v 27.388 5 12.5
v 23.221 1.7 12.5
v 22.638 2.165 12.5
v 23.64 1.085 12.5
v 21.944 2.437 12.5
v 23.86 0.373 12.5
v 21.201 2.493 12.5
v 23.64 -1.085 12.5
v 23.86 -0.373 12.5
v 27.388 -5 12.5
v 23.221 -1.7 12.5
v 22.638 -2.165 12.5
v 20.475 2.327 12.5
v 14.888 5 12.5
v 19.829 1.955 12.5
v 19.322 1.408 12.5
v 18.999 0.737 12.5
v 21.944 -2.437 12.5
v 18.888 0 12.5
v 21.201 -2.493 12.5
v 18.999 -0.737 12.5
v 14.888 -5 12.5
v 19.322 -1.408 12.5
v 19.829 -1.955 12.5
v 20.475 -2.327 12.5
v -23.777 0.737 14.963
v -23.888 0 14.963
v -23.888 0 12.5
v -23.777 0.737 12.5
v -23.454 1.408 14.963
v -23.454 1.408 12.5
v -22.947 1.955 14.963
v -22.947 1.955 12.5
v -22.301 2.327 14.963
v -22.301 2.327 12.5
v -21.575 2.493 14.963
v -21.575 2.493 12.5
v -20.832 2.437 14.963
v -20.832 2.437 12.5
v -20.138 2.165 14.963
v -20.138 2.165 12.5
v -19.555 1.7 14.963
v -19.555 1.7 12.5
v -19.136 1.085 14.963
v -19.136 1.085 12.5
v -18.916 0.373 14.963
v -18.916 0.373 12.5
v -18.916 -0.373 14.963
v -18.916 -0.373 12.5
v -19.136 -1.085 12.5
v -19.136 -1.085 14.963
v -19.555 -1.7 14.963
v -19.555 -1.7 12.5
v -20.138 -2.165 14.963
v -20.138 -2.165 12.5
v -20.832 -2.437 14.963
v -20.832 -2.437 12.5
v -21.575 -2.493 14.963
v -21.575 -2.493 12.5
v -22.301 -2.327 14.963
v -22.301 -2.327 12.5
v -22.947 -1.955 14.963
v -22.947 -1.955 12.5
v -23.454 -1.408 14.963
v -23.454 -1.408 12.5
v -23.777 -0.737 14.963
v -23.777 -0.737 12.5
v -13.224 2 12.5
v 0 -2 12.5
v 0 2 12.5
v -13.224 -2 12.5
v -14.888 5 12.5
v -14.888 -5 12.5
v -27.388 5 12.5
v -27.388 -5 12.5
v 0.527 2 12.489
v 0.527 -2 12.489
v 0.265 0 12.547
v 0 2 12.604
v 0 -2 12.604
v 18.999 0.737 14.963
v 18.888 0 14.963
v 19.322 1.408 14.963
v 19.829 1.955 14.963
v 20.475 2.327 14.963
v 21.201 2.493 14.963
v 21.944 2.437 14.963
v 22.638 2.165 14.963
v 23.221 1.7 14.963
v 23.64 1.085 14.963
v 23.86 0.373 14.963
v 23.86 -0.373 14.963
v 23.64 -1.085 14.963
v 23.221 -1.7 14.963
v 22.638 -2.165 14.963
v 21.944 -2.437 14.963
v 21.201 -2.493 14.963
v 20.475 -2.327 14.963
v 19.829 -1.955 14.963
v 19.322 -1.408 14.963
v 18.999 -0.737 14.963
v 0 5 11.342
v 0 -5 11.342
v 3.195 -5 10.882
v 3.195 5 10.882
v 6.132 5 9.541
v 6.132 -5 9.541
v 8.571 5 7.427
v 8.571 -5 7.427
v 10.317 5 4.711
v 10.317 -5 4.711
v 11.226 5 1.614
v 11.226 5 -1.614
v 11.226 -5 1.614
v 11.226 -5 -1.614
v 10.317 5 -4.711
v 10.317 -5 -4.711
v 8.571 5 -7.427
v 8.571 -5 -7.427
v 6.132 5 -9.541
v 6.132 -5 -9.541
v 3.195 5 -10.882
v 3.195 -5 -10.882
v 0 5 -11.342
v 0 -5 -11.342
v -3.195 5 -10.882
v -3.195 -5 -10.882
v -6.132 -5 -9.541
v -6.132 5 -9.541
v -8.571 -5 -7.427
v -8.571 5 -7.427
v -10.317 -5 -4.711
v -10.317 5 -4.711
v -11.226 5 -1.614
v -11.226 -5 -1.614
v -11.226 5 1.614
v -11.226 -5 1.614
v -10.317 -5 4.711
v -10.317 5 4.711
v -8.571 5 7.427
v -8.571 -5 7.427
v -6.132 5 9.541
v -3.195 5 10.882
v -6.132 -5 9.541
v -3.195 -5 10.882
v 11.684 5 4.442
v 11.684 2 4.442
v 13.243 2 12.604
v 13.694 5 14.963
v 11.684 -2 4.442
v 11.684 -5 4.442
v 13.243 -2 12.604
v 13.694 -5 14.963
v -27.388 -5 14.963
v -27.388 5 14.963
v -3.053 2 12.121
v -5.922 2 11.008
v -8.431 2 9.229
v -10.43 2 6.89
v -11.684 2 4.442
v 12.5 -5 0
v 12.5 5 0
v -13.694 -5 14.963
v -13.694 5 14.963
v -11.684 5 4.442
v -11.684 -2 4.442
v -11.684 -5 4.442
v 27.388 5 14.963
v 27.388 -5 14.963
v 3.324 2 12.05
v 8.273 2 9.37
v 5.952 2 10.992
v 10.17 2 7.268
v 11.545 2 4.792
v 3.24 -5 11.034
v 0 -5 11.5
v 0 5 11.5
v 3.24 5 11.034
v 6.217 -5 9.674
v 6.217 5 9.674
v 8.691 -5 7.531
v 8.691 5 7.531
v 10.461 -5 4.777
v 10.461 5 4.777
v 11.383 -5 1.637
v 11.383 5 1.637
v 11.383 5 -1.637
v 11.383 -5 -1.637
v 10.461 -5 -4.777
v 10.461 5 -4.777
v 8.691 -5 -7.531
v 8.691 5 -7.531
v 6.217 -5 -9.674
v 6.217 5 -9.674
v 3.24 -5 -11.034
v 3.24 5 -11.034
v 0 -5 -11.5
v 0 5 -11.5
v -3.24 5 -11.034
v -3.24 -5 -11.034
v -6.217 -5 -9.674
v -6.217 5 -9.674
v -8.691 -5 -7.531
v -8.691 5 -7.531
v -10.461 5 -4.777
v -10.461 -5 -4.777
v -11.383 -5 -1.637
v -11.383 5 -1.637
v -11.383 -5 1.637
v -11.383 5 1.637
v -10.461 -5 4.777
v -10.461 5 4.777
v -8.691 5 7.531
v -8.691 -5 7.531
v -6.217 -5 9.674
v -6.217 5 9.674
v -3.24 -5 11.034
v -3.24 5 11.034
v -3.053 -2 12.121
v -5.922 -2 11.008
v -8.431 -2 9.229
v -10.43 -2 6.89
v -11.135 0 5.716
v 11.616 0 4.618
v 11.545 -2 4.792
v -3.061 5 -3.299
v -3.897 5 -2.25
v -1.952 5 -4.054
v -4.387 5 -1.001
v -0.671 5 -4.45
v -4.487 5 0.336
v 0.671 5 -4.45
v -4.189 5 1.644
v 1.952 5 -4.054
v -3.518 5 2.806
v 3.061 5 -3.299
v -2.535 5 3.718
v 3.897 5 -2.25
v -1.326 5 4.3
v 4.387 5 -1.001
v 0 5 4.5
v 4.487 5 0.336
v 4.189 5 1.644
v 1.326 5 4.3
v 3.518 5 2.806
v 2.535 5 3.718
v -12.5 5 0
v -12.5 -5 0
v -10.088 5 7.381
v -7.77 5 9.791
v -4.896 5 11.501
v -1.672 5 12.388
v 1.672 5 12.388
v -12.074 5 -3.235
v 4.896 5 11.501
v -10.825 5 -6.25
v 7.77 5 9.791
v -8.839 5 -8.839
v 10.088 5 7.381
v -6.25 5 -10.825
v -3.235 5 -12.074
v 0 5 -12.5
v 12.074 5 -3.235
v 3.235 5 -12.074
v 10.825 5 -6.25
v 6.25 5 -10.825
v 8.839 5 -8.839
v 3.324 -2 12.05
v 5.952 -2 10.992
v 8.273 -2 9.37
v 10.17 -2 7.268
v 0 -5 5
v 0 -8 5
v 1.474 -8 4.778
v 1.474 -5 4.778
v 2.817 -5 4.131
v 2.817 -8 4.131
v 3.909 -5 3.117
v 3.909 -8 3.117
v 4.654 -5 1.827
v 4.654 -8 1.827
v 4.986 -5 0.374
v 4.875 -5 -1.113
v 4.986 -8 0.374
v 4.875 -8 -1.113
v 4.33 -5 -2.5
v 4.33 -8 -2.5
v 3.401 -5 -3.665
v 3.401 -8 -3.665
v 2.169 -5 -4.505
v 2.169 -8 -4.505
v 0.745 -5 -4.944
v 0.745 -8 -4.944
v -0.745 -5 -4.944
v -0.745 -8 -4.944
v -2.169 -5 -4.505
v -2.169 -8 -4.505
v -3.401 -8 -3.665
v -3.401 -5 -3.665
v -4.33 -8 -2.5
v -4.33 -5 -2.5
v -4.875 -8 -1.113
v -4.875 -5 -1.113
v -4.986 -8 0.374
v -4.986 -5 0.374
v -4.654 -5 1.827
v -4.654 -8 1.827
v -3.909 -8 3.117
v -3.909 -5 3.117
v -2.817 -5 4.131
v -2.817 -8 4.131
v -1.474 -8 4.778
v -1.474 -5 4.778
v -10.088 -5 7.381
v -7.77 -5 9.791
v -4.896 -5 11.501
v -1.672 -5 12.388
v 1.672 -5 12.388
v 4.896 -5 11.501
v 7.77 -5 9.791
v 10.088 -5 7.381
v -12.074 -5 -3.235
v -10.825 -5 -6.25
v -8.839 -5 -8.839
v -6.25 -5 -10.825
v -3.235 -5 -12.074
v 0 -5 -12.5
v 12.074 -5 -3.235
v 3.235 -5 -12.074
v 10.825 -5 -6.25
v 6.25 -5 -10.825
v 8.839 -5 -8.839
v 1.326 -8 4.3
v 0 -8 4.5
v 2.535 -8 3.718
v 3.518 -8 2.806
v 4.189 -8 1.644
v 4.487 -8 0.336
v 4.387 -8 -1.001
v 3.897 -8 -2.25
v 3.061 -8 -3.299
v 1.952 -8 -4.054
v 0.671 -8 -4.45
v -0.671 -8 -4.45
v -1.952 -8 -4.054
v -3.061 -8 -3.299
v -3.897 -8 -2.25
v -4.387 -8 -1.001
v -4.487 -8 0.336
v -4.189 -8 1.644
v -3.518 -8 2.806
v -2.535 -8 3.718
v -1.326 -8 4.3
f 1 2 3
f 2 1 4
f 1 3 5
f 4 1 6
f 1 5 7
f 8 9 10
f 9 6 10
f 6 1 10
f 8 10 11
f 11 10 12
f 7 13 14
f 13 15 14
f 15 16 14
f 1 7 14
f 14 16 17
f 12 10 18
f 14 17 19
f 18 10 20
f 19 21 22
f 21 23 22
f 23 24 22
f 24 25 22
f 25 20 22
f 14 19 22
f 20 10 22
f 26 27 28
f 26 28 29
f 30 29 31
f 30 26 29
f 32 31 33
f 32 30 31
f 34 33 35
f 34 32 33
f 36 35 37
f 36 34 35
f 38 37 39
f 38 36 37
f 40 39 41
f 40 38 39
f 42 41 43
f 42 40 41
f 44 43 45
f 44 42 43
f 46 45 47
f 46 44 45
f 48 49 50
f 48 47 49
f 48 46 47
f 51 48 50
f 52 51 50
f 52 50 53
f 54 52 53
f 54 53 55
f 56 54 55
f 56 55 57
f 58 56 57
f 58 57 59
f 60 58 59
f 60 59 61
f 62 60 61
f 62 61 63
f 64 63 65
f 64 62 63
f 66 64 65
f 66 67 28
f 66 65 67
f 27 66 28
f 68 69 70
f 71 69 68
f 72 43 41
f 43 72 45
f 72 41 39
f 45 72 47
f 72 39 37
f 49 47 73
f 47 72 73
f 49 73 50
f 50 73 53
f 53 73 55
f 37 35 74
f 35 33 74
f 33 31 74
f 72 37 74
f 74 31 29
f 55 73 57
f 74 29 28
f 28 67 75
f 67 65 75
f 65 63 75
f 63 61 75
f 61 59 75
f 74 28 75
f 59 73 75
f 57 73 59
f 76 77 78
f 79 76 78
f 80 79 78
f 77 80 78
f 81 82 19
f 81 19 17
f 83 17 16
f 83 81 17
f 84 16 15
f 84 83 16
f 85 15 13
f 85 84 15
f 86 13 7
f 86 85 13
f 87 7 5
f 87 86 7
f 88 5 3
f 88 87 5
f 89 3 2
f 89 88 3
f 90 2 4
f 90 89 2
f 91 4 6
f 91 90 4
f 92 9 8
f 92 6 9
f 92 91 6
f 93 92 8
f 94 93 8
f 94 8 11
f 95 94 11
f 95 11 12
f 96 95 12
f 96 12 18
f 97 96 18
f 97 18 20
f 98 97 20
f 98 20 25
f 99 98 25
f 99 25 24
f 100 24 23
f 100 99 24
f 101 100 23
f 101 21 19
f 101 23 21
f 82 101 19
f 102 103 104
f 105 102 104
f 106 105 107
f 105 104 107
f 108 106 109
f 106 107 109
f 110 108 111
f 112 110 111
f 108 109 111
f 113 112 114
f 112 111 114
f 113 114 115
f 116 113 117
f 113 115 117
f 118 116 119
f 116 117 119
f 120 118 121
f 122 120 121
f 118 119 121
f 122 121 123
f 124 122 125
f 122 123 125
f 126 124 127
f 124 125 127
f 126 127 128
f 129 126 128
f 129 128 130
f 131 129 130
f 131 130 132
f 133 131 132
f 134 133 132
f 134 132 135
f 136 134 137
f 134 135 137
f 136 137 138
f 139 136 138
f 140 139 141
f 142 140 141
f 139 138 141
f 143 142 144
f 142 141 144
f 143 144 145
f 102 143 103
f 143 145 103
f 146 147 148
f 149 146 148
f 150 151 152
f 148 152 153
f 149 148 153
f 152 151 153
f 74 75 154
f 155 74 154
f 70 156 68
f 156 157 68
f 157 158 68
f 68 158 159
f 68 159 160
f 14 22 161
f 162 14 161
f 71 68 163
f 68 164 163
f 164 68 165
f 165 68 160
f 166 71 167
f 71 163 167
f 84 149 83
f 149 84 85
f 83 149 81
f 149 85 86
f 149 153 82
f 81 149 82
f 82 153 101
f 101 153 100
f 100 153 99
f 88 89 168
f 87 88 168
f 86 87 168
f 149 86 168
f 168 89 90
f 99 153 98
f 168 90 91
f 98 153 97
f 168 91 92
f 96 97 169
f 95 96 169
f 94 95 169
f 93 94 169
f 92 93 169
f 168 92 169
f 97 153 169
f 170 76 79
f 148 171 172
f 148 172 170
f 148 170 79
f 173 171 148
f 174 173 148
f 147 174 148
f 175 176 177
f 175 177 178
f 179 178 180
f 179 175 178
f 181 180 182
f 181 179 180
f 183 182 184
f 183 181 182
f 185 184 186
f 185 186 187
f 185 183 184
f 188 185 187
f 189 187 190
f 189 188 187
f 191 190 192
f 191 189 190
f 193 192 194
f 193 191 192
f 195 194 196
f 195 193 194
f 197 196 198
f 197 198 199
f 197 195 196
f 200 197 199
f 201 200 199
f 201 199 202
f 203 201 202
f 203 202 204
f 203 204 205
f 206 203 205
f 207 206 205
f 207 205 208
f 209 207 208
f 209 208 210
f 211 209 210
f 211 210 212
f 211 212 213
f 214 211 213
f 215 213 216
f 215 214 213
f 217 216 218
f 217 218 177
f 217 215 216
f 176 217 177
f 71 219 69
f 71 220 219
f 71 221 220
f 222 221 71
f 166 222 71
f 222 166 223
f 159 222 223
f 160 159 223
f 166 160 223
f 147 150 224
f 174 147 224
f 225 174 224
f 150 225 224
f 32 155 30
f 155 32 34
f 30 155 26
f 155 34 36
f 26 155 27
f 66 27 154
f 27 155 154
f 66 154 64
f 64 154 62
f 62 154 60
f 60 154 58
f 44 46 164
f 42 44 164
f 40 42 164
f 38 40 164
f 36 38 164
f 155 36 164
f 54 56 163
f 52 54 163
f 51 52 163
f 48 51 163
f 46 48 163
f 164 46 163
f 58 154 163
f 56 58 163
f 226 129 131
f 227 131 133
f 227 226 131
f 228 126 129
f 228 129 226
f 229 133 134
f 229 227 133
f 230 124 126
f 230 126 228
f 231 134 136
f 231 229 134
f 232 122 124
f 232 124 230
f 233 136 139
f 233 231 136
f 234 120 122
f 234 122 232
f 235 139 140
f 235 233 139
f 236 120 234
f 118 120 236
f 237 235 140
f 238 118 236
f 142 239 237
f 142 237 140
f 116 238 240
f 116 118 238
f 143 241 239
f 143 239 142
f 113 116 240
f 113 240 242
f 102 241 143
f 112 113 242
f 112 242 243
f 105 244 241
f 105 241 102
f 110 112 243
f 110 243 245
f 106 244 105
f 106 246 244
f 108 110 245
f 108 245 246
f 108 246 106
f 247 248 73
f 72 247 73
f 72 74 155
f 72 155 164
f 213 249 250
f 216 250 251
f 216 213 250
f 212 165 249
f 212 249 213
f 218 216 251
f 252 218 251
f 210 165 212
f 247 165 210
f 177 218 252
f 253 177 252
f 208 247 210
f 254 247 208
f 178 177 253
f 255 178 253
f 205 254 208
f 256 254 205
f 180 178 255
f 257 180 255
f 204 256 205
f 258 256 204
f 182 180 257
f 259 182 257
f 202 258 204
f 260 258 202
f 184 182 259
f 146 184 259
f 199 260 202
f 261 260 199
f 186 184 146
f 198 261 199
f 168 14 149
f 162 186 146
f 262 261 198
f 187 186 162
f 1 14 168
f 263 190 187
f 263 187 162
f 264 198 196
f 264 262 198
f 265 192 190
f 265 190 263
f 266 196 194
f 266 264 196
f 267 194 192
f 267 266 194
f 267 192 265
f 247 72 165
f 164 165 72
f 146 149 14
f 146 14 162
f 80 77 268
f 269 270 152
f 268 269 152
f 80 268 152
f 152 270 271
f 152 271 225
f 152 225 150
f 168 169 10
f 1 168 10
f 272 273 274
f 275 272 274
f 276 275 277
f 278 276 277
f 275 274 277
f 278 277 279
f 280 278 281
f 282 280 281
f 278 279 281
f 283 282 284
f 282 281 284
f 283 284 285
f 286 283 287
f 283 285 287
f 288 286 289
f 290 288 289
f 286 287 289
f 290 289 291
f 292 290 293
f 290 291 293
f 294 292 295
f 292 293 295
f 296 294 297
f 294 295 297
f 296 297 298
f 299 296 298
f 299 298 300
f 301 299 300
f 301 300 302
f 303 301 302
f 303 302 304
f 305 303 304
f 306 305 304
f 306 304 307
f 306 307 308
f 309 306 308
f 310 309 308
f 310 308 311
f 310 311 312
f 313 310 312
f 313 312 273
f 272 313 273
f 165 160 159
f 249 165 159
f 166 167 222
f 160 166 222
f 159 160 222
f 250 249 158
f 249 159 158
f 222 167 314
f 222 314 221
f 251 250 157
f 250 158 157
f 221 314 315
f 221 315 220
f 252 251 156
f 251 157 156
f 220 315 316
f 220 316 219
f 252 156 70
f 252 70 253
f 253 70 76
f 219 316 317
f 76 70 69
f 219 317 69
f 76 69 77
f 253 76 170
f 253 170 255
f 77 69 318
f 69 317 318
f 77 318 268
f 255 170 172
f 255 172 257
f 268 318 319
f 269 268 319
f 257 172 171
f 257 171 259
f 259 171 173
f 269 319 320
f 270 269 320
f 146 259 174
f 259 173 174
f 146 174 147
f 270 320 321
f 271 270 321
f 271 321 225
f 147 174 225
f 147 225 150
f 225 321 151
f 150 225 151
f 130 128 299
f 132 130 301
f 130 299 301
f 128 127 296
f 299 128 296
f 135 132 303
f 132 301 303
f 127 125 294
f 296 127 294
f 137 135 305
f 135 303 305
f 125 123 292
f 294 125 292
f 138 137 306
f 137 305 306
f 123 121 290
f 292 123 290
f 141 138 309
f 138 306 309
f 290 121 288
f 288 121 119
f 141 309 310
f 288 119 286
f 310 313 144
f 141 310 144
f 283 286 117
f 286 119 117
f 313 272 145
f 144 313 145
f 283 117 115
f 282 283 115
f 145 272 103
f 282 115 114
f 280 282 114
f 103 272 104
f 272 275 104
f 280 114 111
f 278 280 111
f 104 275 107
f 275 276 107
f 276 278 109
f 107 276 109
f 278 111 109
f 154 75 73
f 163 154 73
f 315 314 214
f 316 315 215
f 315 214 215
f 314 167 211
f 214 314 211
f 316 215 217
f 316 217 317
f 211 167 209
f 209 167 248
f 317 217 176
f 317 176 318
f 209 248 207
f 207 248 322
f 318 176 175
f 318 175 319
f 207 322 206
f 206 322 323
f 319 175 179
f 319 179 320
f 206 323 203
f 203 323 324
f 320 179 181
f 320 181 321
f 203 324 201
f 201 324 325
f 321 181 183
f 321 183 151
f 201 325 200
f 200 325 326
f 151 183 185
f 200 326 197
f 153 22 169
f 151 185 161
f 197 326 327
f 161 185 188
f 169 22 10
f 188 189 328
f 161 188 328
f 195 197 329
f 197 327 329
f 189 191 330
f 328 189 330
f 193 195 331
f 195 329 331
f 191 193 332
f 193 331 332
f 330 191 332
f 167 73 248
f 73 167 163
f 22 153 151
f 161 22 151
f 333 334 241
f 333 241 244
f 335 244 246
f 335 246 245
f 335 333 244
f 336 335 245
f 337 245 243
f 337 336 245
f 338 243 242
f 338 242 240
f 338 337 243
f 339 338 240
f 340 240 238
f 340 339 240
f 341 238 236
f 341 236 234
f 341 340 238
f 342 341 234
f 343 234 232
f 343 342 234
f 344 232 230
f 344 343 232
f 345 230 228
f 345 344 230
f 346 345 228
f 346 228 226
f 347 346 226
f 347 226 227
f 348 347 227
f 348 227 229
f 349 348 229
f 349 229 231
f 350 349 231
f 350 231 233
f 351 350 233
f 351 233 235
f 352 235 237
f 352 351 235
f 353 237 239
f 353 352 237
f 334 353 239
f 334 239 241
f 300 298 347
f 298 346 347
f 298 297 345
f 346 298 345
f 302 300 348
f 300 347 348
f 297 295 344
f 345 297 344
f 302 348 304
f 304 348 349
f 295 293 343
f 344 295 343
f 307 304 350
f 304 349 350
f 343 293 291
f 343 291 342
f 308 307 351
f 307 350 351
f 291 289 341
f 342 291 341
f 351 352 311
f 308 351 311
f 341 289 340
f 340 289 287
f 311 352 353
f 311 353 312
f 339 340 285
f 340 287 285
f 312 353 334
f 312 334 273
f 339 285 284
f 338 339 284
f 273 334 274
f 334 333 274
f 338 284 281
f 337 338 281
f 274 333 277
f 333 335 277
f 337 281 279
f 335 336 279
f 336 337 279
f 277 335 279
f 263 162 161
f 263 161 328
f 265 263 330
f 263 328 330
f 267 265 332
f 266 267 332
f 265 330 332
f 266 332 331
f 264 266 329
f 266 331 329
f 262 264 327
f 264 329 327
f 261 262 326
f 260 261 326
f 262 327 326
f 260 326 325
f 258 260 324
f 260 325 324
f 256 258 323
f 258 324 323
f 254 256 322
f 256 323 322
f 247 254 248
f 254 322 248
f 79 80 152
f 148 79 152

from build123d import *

# Parameters (mm, degrees)
BOSS_EXTRUDE1_DEPTH      = 5
BOSS_EXTRUDE1_DEPTH_BACK = 5
SKETCH1_R                = 11.5
BOSS_EXTRUDE2_START      = -2
BOSS_EXTRUDE2_DEPTH      = 4
BOSS_EXTRUDE3_DEPTH      = 2
BOSS_EXTRUDE3_DEPTH_BACK = 2
BOSS_EXTRUDE4_DEPTH      = 5
BOSS_EXTRUDE4_DEPTH_BACK = 5
SKETCH5_R                = 11.341581645
SKETCH5_R_2              = 10.881998828
BOSS_EXTRUDE5_DEPTH      = 5
BOSS_EXTRUDE5_DEPTH_BACK = 5
SKETCH6_R                = 10.881998828
SKETCH6_R_2              = 5
BOSS_EXTRUDE6_DEPTH      = 5
BOSS_EXTRUDE6_DEPTH_BACK = 8
SKETCH7_R                = 5
SKETCH7_R_2              = 4.5
CUT_EXTRUDE1_DEPTH       = 38.935559418
CUT_EXTRUDE1_DEPTH_BACK  = 38.935559418
SKETCH8_R                = 2.5


# Read off the part's stored shape, not the designer's step: Boss-Extrude2
with BuildPart() as part:
    # Sketch1 → Boss-Extrude1 (new, two sides: drawn at the far end of the back side and taken through both)
    with BuildSketch(Plane(origin=(0, 0, 0), x_dir=(1, 0, 0), z_dir=(0, 1, 0)).offset(-BOSS_EXTRUDE1_DEPTH_BACK)):
        with BuildLine():
            Line((-12.5, 0), (-14.888075294, -12.5))
            Line((-14.888075294, -12.5), (-27.388075294, -12.5))
            Line((-27.388075294, -12.5), (-27.388075294, -14.962515671))
            Line((-27.388075294, -14.962515671), (-14.888075294, -14.962515671))
            Line((-14.888075294, -14.962515671), (-13.694037647, -14.962515671))
            Line((-13.694037647, -14.962515671), (-11.684129612, -4.441971995))
            ThreePointArc((-11.684129612, -4.441971995), (0, -12.5), (11.684129612, -4.441971995))
            Line((11.684129612, -4.441971995), (13.694037647, -14.962515671))
            Line((13.694037647, -14.962515671), (14.888075294, -14.962515671))
            Line((14.888075294, -14.962515671), (27.388075294, -14.962515671))
            Line((27.388075294, -14.962515671), (27.388075294, -12.5))
            Line((27.388075294, -12.5), (14.888075294, -12.5))
            Line((14.888075294, -12.5), (12.5, 0))
            ThreePointArc((12.5, 0), (0, 12.5), (-12.5, 0))
        make_face()
        with Locations(Location((0, 0, 0), (0, 0, 270))):
            Circle(SKETCH1_R, mode=Mode.SUBTRACT)
    extrude(amount=BOSS_EXTRUDE1_DEPTH + BOSS_EXTRUDE1_DEPTH_BACK)

    # Boss-Extrude2 outline → Boss-Extrude2 (add)
    with BuildSketch(Plane(origin=(0, 0, 0), x_dir=(1, 0, 0), z_dir=(0, 1, 0)).offset(BOSS_EXTRUDE2_START)):
        with BuildLine():
            ThreePointArc((11.545060202, -4.7918248), (7.158411272, -10.247299549), (0.526660373, -12.488900226))
            add(Edge.make_bspline(
                [(0.526660373, -12.488900226), (0.266171619, -12.548222015), (0, -12.604103366)],
                knots=[0.689319893, 0.689319893, 0.689319893, 0.709533534, 0.709533534, 0.709533534], degree=2))
            Line((0, -12.604103366), (13.243472354, -12.604103366))
            Line((13.243472354, -12.604103366), (11.684129612, -4.441971995))
            add(Edge.make_bspline(
                [(11.684129612, -4.441971995), (11.61743634, -4.618618616), (11.545060202, -4.7918248)],
                knots=[0, 0, 0, 0.020213641, 0.020213641, 0.020213641], degree=2))
        make_face()
    extrude(amount=BOSS_EXTRUDE2_DEPTH)

    # Sketch4 → Boss-Extrude3 (add, two sides: drawn at the far end of the back side and taken through both)
    with BuildSketch(Plane(origin=(0, 0, 0), x_dir=(1, 0, 0), z_dir=(0, 1, 0)).offset(-BOSS_EXTRUDE3_DEPTH_BACK)):
        with BuildLine():
            Line((0, -12.5), (-13.22358382, -12.5))
            Line((-13.22358382, -12.5), (-11.684129612, -4.441971995))
            add(Edge.make_bspline(
                [(0, -12.5), (-9.420476938, -10.800220507), (-11.684129612, -4.441971995)],
                knots=[0, 0, 0, 0.791193812, 0.791193812, 0.791193812], degree=2))
        make_face()
    extrude(amount=BOSS_EXTRUDE3_DEPTH + BOSS_EXTRUDE3_DEPTH_BACK)

    # Sketch8 → Cut-Extrude1 (cut, two sides: drawn at the far end of the back side and taken through both)
    with BuildSketch(Plane(origin=(0, 0, 12.5), x_dir=(-1, 0, 0), z_dir=(0, 0, -1)).offset(-CUT_EXTRUDE1_DEPTH_BACK)):
        with Locations((21.388075294, 0)):
            Circle(SKETCH8_R)
        with Locations((-21.388075294, 0)):
            Circle(SKETCH8_R)
    extrude(amount=CUT_EXTRUDE1_DEPTH + CUT_EXTRUDE1_DEPTH_BACK, mode=Mode.SUBTRACT)


with BuildPart() as body_2:
    # Sketch5 → Boss-Extrude4 (new, two sides: drawn at the far end of the back side and taken through both)
    with BuildSketch(Plane(origin=(0, 0, 0), x_dir=(1, 0, 0), z_dir=(0, 1, 0)).offset(-BOSS_EXTRUDE4_DEPTH_BACK)):
        with Locations(Location((0, 0, 0), (0, 0, 270))):
            Circle(SKETCH5_R)
        with Locations(Location((0, 0, 0), (0, 0, 270))):
            Circle(SKETCH5_R_2, mode=Mode.SUBTRACT)
    extrude(amount=BOSS_EXTRUDE4_DEPTH + BOSS_EXTRUDE4_DEPTH_BACK)



with BuildPart() as body_3:
    # Sketch6 → Boss-Extrude5 (new, two sides: drawn at the far end of the back side and taken through both)
    with BuildSketch(Plane(origin=(0, 0, 0), x_dir=(1, 0, 0), z_dir=(0, 1, 0)).offset(-BOSS_EXTRUDE5_DEPTH_BACK)):
        with Locations(Location((0, 0, 0), (0, 0, 270))):
            Circle(SKETCH6_R)
        with Locations(Location((0, 0, 0), (0, 0, 270))):
            Circle(SKETCH6_R_2, mode=Mode.SUBTRACT)
    extrude(amount=BOSS_EXTRUDE5_DEPTH + BOSS_EXTRUDE5_DEPTH_BACK)


with BuildPart() as body_2_1:
    add(body_2.part)

    add(body_3.part)  # Boss-Extrude6 merges body 3
    # Sketch7 → Boss-Extrude6 (add, two sides: drawn at the far end of the back side and taken through both)
    with BuildSketch(Plane(origin=(0, 0, 0), x_dir=(1, 0, 0), z_dir=(0, 1, 0)).offset(-BOSS_EXTRUDE6_DEPTH_BACK)):
        with Locations(Location((0, 0, 0), (0, 0, 270))):
            Circle(SKETCH7_R)
        with Locations(Location((0, 0, 0), (0, 0, 270))):
            Circle(SKETCH7_R_2, mode=Mode.SUBTRACT)
    extrude(amount=BOSS_EXTRUDE6_DEPTH + BOSS_EXTRUDE6_DEPTH_BACK)


solid = Compound([part.part, body_2_1.part])
